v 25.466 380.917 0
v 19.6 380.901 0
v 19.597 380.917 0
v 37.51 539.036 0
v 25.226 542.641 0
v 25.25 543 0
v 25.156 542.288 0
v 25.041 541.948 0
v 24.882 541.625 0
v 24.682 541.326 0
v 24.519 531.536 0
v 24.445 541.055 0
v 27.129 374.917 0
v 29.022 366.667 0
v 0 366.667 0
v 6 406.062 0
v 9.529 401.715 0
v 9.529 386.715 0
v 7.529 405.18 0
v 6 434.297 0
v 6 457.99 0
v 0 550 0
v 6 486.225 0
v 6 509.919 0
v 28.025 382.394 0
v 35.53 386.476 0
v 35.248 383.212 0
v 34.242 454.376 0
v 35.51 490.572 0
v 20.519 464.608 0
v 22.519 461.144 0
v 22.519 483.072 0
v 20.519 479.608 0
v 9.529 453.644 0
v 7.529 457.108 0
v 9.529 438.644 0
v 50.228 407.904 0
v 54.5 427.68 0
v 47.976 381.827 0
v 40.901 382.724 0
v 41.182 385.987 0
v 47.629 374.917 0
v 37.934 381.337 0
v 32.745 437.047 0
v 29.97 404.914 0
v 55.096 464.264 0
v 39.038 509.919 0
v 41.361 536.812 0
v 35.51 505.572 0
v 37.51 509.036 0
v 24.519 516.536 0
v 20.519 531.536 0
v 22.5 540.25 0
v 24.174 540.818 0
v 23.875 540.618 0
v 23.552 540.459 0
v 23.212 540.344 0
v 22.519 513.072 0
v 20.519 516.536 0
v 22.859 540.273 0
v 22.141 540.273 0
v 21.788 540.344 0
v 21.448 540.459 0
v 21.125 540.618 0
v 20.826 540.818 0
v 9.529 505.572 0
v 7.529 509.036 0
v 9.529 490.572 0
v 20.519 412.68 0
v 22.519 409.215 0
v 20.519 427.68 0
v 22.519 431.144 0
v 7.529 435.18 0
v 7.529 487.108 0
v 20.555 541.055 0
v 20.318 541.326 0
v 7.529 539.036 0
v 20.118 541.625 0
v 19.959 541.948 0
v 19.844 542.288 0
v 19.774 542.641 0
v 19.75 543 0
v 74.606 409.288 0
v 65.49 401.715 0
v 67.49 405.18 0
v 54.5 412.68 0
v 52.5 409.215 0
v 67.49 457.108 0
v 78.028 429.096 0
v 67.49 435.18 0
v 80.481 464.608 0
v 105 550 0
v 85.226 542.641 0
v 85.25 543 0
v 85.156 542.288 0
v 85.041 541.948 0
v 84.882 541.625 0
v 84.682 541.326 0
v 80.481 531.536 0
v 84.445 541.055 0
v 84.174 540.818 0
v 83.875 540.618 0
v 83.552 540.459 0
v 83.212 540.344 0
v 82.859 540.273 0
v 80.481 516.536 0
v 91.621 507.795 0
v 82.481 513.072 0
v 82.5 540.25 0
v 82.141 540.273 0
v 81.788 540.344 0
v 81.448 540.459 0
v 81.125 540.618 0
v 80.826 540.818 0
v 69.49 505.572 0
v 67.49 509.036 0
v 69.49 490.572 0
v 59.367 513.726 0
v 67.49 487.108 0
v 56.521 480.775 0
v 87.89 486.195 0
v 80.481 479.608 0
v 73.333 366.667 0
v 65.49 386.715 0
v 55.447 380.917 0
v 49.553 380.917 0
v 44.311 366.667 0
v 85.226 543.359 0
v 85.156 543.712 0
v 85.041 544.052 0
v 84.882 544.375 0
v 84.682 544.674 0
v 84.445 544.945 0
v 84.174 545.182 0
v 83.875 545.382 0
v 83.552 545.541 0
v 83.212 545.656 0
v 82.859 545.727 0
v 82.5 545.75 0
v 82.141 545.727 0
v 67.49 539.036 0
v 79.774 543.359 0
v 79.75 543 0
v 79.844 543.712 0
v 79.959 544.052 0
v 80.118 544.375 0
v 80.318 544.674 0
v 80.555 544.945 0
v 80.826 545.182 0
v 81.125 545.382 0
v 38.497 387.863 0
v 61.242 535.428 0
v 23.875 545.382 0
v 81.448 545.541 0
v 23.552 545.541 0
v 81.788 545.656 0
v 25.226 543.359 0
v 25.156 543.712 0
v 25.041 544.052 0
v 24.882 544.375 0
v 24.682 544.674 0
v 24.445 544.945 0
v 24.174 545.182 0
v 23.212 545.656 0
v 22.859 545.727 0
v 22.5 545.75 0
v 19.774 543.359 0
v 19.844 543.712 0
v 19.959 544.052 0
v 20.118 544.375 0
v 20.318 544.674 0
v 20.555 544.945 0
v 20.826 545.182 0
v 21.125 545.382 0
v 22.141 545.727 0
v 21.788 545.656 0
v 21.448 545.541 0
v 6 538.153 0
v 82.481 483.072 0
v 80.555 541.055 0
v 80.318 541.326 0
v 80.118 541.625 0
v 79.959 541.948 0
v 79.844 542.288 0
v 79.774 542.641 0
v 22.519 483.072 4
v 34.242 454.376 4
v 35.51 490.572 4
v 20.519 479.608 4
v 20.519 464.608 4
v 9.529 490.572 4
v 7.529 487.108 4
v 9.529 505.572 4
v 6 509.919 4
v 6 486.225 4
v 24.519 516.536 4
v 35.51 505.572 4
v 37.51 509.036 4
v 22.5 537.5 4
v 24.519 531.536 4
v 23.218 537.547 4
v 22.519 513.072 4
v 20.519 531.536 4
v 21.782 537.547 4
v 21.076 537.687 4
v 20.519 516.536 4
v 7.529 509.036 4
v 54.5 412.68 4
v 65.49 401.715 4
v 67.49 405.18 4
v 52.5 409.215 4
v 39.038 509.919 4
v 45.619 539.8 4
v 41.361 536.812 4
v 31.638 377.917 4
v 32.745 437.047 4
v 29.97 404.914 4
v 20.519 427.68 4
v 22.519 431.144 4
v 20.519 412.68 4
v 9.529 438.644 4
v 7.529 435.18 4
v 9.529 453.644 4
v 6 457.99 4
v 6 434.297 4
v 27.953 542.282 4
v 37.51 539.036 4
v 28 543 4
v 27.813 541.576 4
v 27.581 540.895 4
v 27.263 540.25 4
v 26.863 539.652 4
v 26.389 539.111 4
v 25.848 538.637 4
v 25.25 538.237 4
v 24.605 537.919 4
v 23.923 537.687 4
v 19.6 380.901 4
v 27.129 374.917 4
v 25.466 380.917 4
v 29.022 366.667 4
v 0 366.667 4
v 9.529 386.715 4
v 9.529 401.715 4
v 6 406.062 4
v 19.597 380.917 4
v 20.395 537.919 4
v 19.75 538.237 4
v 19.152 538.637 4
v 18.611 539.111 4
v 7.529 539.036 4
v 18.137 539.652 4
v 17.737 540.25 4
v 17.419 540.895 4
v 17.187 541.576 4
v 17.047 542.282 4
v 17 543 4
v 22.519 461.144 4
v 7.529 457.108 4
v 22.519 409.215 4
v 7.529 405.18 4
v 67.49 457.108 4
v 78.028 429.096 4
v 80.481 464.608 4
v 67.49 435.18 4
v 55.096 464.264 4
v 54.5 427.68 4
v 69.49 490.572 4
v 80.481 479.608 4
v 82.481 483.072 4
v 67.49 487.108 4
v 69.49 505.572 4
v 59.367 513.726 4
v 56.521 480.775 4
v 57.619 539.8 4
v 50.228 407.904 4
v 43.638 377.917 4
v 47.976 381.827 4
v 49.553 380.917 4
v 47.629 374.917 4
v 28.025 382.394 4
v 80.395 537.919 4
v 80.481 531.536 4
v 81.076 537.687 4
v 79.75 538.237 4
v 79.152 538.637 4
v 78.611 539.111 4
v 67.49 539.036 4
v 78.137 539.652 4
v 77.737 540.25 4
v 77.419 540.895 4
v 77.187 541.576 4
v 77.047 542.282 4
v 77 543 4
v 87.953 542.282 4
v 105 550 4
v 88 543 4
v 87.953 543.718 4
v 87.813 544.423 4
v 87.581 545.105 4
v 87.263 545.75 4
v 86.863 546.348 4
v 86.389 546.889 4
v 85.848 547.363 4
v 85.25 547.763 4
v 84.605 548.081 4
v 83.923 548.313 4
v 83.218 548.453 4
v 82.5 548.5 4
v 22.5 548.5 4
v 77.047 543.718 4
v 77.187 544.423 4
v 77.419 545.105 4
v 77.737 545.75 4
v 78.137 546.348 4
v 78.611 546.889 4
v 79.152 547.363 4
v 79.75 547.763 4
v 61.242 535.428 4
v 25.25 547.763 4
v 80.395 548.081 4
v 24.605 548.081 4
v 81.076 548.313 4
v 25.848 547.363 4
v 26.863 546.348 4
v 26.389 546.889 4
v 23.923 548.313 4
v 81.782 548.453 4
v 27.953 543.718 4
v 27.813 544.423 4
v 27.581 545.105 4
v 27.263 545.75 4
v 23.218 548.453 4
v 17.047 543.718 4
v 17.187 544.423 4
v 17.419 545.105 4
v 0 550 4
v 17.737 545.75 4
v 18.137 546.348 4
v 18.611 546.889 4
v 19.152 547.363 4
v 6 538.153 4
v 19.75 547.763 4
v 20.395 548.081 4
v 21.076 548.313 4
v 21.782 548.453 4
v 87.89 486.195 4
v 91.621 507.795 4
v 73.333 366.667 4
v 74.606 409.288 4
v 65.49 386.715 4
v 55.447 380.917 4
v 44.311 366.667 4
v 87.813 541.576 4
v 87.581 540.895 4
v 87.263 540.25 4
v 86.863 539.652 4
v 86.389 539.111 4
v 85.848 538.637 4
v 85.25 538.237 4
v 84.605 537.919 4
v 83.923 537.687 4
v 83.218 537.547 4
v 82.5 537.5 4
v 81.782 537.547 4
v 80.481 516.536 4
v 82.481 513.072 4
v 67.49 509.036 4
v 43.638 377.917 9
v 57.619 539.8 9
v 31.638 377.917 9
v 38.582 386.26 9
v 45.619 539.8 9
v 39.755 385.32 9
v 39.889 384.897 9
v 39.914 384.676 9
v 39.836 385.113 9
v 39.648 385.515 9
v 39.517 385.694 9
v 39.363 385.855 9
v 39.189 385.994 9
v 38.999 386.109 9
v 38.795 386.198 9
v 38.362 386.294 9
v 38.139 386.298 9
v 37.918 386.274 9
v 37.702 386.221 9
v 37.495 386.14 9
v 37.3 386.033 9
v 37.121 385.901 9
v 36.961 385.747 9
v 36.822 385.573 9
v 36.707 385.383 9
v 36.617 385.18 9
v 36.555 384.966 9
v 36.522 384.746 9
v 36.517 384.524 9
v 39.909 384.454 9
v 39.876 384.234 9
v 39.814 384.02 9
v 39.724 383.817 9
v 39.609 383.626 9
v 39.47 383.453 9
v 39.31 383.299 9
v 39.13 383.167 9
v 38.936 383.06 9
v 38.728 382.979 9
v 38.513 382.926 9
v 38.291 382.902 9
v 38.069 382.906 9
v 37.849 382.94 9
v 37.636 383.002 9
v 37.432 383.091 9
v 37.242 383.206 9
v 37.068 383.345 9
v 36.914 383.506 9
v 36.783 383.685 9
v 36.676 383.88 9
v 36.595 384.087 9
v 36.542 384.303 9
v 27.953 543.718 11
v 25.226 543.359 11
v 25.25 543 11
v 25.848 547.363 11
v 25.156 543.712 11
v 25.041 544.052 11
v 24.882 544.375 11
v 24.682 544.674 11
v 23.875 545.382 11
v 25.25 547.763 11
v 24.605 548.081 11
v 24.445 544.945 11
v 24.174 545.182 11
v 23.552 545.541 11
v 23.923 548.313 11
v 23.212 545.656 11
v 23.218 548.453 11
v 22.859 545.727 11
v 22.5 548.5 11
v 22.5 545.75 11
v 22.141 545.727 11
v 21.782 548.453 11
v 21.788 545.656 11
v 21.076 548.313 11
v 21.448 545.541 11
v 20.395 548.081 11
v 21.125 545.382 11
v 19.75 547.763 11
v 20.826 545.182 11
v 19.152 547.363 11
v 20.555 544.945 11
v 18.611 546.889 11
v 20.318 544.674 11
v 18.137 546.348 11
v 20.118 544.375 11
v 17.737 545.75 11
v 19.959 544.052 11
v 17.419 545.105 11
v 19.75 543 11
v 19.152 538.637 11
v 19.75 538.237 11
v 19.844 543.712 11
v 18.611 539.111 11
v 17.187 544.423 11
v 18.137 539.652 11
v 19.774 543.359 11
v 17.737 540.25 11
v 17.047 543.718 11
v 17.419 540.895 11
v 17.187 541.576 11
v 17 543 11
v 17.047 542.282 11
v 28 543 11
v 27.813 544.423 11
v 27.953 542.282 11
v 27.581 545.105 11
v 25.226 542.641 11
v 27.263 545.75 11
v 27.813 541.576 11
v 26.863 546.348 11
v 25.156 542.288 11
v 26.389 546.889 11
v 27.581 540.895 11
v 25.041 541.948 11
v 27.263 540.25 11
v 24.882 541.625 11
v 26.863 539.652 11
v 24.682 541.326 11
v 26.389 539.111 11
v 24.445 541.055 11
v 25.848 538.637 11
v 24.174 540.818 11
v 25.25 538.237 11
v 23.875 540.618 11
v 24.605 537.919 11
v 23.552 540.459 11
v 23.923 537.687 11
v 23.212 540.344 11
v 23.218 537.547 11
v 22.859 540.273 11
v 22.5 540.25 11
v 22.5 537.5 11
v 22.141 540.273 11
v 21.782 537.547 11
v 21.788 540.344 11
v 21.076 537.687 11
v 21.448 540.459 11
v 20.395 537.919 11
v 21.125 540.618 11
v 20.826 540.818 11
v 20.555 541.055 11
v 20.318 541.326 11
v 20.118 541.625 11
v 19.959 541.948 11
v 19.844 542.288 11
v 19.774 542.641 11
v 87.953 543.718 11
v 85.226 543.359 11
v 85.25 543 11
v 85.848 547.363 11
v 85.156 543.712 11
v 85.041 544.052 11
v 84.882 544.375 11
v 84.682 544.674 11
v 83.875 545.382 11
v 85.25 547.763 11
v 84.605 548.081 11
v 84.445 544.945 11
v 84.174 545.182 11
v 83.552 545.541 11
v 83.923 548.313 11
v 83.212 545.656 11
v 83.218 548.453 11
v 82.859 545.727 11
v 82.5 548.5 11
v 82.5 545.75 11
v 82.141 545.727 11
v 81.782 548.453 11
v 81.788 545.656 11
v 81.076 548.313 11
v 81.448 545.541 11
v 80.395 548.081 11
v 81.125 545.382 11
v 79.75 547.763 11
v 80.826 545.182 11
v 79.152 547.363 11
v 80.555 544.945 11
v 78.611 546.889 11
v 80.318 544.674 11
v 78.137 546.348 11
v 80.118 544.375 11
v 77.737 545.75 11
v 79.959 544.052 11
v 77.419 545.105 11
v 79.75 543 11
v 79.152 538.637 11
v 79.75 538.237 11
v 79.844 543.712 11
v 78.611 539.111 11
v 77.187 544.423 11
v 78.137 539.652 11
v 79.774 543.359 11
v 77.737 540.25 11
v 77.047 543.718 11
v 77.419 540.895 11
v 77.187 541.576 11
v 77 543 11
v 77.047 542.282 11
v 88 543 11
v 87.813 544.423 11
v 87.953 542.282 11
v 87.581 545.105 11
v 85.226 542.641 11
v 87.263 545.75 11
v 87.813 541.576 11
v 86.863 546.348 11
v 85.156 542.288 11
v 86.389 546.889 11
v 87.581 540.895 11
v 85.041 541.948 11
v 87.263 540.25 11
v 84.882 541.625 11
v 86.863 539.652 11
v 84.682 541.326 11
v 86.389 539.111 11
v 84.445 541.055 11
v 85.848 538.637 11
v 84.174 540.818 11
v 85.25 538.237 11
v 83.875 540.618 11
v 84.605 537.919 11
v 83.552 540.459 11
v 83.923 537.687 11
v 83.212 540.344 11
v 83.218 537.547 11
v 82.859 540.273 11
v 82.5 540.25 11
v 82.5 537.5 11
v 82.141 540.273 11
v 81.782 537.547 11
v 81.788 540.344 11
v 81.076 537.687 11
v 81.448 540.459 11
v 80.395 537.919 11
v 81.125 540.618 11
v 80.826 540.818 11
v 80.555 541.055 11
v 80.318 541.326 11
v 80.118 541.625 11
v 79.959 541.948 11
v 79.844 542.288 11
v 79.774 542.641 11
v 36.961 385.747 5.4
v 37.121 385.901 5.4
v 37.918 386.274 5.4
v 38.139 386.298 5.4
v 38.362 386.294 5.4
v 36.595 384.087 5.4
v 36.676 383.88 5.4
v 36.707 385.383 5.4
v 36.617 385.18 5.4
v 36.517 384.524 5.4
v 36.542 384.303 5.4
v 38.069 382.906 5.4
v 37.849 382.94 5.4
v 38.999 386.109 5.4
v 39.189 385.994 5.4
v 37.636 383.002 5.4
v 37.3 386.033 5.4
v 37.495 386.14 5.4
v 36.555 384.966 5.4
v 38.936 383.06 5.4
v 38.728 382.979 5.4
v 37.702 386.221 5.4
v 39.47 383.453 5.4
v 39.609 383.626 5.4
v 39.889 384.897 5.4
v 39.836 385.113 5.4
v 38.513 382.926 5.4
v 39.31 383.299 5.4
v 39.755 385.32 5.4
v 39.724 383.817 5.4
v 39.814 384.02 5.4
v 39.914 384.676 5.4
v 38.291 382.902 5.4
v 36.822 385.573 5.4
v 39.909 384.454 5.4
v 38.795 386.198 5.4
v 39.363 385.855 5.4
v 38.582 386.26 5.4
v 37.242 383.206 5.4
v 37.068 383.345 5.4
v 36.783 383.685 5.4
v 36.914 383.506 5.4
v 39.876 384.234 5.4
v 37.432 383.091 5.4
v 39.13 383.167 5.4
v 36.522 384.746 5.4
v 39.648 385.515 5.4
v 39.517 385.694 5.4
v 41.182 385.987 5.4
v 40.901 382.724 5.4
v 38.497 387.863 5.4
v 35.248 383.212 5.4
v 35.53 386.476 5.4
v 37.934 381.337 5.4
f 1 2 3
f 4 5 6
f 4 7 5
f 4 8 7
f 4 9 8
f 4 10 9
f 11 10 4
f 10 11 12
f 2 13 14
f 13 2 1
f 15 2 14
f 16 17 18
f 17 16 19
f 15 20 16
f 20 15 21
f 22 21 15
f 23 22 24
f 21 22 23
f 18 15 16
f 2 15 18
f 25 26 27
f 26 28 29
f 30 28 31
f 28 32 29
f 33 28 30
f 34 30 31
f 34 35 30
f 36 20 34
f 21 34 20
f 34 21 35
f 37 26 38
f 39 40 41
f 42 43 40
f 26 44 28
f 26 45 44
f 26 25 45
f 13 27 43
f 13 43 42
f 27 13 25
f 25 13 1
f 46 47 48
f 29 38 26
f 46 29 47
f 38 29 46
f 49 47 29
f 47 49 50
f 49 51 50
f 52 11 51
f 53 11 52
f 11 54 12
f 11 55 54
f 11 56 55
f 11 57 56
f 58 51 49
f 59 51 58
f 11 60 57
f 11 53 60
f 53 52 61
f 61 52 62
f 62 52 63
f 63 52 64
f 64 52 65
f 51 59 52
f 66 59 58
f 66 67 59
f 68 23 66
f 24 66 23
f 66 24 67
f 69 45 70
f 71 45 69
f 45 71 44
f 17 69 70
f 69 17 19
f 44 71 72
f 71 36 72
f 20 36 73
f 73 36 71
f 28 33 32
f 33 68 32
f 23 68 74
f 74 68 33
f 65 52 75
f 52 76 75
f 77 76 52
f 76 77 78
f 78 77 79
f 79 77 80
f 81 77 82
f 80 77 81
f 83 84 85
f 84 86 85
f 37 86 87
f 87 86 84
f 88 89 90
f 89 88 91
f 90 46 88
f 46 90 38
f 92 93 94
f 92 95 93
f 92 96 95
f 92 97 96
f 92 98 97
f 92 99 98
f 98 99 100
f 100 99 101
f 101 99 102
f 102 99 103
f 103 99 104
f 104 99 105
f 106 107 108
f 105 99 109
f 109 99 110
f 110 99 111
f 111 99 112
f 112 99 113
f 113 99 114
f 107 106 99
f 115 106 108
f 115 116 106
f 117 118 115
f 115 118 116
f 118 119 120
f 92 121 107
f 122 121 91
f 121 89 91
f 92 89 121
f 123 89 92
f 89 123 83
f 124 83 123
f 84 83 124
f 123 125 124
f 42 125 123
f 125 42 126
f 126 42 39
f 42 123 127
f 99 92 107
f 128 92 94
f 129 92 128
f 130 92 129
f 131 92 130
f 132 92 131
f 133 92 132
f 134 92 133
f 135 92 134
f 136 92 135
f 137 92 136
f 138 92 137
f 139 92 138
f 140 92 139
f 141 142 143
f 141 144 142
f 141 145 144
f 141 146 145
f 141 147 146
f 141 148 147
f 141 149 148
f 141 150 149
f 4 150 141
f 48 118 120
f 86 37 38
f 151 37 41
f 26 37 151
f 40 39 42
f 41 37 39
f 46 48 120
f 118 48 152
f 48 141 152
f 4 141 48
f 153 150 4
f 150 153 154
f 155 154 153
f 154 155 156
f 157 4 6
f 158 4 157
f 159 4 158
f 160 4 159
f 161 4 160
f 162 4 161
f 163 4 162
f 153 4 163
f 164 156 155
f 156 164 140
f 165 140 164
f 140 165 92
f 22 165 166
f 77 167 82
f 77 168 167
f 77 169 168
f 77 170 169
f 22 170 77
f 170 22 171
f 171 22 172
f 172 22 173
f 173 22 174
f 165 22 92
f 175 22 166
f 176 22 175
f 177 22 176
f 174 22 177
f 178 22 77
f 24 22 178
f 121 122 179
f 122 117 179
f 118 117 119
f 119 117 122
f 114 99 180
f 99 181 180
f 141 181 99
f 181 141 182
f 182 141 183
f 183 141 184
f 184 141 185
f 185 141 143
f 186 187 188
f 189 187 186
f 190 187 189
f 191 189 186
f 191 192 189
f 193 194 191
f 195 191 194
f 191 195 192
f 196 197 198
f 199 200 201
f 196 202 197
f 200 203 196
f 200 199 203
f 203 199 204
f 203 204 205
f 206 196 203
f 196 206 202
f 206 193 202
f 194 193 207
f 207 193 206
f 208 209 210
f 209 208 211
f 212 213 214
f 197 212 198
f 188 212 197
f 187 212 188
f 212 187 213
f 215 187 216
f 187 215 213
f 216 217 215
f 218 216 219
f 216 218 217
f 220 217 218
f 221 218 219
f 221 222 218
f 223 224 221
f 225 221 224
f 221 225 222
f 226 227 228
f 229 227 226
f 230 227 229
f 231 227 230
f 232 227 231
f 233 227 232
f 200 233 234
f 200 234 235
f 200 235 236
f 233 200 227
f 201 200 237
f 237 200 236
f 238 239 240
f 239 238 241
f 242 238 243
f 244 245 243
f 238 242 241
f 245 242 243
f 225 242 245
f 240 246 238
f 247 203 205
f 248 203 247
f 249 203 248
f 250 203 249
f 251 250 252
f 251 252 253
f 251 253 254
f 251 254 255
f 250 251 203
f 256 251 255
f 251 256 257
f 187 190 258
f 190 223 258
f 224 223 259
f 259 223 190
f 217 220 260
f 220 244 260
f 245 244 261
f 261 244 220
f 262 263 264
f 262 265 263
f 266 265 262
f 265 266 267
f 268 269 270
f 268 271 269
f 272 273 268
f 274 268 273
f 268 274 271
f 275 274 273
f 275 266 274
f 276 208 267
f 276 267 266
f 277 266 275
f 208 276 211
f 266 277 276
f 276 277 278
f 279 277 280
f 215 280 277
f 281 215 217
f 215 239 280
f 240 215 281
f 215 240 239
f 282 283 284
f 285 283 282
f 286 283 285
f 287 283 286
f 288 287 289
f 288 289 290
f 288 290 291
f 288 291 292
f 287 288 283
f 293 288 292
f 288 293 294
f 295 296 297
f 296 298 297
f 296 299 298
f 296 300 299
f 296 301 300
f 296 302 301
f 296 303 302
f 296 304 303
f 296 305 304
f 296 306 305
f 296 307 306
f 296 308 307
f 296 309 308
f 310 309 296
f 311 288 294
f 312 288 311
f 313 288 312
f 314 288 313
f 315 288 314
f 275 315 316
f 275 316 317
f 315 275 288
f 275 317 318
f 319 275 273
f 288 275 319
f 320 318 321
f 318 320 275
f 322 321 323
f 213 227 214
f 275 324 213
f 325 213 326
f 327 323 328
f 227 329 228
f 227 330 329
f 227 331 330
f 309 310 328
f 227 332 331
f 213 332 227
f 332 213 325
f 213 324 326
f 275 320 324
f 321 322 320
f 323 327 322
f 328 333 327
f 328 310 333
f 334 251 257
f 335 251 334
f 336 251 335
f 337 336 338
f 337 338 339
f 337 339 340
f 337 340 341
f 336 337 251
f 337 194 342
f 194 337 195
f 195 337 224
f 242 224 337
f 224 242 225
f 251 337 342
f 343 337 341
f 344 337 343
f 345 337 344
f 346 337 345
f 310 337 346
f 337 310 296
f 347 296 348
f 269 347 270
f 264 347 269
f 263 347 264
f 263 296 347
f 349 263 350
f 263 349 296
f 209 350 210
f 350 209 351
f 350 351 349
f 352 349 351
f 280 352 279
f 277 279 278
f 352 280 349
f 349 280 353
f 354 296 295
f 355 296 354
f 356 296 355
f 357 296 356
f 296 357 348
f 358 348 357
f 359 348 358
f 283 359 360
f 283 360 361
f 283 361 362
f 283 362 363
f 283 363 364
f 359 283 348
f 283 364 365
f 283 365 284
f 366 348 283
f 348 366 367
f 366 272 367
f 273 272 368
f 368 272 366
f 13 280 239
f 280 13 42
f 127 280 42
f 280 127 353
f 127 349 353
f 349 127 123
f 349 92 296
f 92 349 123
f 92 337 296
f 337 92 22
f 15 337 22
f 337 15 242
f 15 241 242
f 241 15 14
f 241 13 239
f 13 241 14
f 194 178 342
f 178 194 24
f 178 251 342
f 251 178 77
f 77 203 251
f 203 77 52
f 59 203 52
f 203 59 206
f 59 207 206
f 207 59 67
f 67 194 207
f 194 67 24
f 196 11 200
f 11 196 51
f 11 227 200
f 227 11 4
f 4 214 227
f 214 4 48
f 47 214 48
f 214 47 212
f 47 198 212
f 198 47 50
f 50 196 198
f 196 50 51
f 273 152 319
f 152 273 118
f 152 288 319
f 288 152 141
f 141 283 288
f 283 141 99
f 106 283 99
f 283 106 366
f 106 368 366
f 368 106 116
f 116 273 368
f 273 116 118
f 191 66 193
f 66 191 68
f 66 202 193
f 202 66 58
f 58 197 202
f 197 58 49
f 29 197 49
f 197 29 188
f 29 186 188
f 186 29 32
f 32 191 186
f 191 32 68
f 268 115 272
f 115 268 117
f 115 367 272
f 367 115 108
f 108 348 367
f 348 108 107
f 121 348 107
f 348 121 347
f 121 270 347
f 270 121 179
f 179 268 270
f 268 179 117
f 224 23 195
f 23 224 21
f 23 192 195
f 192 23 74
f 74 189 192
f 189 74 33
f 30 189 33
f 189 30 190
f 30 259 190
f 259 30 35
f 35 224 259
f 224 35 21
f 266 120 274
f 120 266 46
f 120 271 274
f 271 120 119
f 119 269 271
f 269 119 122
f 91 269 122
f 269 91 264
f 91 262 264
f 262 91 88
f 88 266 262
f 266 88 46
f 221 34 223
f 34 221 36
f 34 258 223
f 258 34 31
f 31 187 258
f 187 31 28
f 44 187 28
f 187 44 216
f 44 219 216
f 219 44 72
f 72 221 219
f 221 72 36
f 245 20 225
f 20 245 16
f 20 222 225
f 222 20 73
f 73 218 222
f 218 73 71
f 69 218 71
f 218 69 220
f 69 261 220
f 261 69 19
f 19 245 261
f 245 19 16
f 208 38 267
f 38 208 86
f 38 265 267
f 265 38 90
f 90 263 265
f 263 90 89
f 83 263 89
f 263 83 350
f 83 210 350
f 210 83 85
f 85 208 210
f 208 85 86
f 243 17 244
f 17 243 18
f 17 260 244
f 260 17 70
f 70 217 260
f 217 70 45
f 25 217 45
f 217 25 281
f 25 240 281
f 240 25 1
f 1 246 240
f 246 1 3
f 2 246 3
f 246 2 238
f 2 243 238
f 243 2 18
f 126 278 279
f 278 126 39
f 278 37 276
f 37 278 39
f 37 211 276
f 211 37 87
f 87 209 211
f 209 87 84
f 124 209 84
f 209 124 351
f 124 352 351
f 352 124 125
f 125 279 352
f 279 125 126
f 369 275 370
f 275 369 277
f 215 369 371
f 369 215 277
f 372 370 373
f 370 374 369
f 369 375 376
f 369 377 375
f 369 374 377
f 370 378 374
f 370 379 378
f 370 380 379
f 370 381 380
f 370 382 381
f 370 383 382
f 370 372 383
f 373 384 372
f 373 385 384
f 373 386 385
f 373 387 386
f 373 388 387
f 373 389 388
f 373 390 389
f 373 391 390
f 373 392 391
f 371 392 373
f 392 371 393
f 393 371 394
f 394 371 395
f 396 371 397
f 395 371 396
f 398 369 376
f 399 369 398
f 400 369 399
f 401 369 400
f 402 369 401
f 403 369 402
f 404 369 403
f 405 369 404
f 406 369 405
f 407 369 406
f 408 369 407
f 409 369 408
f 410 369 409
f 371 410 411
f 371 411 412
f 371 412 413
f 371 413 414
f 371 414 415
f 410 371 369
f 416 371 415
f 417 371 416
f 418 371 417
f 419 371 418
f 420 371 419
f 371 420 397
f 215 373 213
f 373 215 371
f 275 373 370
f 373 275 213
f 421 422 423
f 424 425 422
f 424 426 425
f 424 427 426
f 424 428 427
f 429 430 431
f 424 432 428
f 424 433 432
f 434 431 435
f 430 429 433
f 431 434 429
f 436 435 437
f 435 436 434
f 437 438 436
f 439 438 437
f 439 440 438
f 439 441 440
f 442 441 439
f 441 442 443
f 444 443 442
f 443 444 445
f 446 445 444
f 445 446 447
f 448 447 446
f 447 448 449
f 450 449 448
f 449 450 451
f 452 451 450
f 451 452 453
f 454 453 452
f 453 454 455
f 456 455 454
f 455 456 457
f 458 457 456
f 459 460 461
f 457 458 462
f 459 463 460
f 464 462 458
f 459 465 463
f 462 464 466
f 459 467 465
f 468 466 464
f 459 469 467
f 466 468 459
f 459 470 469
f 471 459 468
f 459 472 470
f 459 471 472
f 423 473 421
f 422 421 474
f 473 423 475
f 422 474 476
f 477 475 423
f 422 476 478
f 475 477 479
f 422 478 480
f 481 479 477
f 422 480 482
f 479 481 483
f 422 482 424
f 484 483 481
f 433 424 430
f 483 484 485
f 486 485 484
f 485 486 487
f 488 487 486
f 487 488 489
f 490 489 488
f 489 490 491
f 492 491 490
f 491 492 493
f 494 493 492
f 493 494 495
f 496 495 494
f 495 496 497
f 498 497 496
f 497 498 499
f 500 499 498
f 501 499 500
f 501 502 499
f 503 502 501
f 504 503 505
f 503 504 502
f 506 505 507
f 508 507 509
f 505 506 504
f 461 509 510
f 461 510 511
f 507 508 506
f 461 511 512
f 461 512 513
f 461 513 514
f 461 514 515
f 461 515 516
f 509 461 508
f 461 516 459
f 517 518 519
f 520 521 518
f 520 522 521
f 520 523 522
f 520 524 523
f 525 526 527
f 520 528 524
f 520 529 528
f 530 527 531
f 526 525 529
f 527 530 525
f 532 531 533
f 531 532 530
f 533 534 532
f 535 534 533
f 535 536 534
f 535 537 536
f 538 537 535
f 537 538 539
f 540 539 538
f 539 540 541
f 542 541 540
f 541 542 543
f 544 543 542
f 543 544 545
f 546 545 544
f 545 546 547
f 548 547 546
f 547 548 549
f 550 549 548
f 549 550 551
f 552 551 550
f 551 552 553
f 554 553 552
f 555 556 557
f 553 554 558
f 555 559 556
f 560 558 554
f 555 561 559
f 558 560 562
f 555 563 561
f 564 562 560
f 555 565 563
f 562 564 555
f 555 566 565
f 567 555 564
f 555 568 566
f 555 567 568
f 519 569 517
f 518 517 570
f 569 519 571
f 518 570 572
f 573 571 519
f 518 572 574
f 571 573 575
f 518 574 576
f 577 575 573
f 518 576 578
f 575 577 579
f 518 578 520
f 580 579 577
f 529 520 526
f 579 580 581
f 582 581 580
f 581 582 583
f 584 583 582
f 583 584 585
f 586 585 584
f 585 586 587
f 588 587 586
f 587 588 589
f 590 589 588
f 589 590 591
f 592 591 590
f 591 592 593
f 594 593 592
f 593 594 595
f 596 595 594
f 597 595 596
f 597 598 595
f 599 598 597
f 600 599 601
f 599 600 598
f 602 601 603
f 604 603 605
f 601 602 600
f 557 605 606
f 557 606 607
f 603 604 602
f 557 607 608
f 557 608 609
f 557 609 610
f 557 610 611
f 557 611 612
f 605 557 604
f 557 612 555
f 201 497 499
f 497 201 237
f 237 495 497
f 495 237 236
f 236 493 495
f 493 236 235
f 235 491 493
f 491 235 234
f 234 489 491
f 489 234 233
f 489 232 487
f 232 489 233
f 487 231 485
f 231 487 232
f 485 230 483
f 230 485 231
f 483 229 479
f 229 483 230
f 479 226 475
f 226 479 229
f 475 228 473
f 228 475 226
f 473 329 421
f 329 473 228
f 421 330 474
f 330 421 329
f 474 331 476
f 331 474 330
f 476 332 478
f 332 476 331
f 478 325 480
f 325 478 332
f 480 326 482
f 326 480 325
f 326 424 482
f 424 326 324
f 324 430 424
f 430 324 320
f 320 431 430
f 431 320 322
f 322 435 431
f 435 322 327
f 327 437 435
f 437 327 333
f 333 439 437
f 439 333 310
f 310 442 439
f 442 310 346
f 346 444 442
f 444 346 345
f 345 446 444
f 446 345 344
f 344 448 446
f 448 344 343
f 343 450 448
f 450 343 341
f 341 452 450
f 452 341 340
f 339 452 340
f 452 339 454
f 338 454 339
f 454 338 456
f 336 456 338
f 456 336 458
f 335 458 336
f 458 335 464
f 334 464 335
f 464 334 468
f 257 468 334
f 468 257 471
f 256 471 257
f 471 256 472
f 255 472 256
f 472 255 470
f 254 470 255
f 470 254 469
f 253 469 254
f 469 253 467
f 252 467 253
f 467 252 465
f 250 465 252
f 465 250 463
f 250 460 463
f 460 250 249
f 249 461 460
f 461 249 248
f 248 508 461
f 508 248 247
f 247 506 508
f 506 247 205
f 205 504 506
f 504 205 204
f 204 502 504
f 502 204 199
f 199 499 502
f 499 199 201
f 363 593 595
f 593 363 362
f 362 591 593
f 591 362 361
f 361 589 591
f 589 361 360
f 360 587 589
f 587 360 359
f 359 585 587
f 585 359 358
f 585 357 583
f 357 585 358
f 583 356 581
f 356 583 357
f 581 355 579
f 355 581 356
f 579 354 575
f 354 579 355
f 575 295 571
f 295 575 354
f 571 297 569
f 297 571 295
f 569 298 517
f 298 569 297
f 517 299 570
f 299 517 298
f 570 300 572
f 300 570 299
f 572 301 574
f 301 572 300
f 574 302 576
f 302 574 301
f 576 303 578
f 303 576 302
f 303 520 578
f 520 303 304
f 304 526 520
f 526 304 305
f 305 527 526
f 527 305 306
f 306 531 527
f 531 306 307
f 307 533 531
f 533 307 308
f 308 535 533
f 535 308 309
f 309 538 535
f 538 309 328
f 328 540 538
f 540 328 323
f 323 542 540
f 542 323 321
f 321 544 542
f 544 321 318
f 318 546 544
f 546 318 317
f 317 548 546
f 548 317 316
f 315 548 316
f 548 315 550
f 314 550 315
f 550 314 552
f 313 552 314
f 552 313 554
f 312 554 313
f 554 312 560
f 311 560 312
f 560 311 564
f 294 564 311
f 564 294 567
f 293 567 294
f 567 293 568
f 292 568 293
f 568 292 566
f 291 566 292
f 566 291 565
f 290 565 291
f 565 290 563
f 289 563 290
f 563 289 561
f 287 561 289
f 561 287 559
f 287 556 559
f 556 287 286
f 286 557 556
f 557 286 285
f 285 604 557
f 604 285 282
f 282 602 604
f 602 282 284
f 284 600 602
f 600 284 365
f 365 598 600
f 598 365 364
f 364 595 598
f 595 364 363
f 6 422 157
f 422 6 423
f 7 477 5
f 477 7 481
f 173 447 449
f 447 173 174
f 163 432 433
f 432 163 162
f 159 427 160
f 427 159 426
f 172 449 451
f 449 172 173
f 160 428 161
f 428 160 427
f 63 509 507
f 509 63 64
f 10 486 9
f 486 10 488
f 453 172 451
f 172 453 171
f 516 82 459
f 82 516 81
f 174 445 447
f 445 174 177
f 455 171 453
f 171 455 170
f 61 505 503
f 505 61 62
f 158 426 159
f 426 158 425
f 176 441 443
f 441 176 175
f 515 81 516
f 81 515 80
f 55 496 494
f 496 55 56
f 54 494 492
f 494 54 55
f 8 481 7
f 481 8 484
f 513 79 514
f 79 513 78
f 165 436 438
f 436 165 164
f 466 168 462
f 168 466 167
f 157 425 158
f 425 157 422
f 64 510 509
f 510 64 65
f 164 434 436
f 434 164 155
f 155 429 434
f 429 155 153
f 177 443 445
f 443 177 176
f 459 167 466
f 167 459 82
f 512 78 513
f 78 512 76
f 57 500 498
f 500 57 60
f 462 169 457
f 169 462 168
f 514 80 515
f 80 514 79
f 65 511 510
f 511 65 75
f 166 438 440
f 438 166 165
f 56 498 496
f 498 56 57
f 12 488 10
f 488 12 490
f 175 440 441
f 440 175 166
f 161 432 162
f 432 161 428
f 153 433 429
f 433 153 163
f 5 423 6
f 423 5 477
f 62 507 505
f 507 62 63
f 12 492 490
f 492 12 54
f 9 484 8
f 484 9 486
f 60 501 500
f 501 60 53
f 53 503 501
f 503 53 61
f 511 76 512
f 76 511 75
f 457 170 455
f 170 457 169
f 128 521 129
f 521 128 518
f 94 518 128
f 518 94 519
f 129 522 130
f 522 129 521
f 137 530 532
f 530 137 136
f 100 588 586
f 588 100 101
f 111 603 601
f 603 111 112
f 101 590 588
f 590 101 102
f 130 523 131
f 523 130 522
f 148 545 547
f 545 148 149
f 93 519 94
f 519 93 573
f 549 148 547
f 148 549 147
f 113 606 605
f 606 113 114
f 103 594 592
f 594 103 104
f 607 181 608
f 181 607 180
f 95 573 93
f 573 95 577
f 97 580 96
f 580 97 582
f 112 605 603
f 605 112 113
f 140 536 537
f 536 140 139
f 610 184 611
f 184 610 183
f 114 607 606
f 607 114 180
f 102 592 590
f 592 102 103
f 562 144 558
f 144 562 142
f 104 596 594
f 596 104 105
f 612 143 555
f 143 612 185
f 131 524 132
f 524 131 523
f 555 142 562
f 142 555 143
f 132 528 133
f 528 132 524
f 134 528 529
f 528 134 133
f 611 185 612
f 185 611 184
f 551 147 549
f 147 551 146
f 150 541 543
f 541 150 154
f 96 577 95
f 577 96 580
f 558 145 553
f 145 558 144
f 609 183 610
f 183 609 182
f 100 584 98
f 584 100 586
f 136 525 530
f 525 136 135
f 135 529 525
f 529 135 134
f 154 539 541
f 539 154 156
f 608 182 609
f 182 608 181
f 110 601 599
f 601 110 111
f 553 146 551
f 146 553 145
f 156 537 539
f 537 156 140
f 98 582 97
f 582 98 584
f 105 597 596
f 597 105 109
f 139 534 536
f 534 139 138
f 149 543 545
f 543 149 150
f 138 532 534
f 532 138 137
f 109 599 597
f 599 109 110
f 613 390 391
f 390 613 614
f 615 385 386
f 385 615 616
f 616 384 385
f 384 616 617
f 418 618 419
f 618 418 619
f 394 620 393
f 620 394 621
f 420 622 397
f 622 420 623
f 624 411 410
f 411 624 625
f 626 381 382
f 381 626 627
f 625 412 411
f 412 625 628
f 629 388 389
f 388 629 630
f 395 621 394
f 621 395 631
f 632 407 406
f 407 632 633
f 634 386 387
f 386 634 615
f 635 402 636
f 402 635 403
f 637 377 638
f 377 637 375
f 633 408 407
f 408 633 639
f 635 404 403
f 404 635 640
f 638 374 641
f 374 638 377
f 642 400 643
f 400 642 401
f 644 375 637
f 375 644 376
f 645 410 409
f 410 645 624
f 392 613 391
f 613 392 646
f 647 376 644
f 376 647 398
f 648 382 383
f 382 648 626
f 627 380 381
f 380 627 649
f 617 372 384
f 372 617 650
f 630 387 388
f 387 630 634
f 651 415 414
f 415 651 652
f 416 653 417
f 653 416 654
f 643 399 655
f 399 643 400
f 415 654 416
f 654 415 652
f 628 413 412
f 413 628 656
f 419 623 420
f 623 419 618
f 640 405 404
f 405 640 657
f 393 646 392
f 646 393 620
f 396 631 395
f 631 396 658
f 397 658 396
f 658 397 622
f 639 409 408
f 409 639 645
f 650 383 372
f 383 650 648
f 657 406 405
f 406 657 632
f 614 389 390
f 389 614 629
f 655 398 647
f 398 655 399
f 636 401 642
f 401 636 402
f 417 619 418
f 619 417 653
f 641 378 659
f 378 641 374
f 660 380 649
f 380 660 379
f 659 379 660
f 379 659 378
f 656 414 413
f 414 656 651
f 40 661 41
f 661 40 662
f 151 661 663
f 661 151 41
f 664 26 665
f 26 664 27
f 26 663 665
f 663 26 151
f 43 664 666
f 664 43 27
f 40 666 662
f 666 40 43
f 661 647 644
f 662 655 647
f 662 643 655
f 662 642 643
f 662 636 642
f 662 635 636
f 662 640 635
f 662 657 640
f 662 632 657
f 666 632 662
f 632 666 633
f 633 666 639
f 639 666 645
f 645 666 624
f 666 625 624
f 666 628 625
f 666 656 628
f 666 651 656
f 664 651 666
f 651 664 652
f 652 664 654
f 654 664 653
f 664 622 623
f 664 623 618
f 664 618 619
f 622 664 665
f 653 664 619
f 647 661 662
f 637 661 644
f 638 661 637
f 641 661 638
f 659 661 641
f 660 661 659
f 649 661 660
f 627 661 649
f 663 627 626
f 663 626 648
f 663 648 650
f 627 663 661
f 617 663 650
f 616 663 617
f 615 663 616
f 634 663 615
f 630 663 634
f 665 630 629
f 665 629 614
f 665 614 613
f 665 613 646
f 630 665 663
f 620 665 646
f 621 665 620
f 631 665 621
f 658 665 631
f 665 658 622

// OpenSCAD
// Window cat guard (tilt window): a CanFactory generator, published under CC BY-NC-SA 4.0.
//
// An adaptation of "Tilted window cat protection" on MakerWorld
// (https://makerworld.com/de/models/3234292-tilted-window-cat-protection, CC BY-NC-SA 4.0):
// a new parametric generator built the way its parts are (references/); see ../ATTRIBUTION.md.
//
// A tilted (bottom-hung) window leaves a triangular gap on each side between
// the sash and the frame, and a gap across the top. A cat that squeezes into
// a side gap slides down into the narrowing wedge and is trapped. The guard
// closes the gaps with printed honeycomb panels:
//
// - two side panels (PART = "side", SIDE = "left" or "right"): a right-angled
//   trapezoid, HEIGHT tall, GAP wide at the top and TIP wide at the bottom,
//   with one spine along its middle;
// - a top strip (PART = "strip"), GAP deep, spanning the window's WIDTH
//   between the side panels, with two ribs along it.
//
// Every panel longer than MAX_LENGTH is split into equal segments, each its
// own part (SEGMENT; 1 = the side panel's top or the strip's left end), so
// that every part fits a print bed. This is how the reference parts in
// references/ are built (see docs/window-cat-guard.md for what was measured):
//
// - segments join edge to edge with an in-plane dovetail: a tab on one
//   segment drops into a notch in the next, perpendicular to the plate;
// - the spine (or rib) runs on over the tab and laps LAP mm onto the next
//   segment's plate, so the joint cannot fold and the segments stay flush;
// - the dovetail only goes together, and comes apart, perpendicular to the
//   plate. So that the joint holds (JOINTS = "nut-bolt" or "threaded-insert";
//   not in the reference), a splice bar (PART = "bar") lies on the two spines
//   (or ribs) across every joint, with one countersunk screw down into each
//   segment: into a nut in a pocket from the plate's back, or into a heat-set
//   insert in the spine. JOINTS = "glue" leaves the dovetails as they are;
// - the top strip's two end segments carry pins along the strip, which plug
//   into bosses on the side panels' top segments: the guard is one U-shaped
//   frame that stands in the window.
//
// Every part prints flat as modelled: the plate on the bed (z = 0), spine,
// ribs and bosses on top, no supports; a splice bar lies flat, its countersinks up. The pins lie along the bed with a
// flat underside. A segment keeps the panel's own coordinates (a side panel:
// x across the gap from its straight edge, y up from its tip; the strip: x
// along it from its left end, y across the gap), so the assembly places every
// segment of a panel at the same pose; the slicer centres them on the bed.
//
// The joint sizes below are mirrored by WINDOW_CAT_GUARD in
// packages/contracts/src/windowCatGuard.ts (a test compares them).

// ---------------------------------------------------------------

// Which piece to make: a side panel segment, a top strip segment or a splice bar (all bars are alike)
PART = "side"; //[side,strip,bar]
// Which side panel: the right one is the left one mirrored
SIDE = "left"; //[left,right]
// Which segment (1 = the side panel's top / the strip's left end)
SEGMENT = 1; //[1:1:8]

// Height of a side panel: the height of the side gap it closes
HEIGHT = 550; //[150:1:1500]
// Width of the side gap at the top: the side panels' top width and the strip's depth
GAP = 105; //[60:0.5:200]
// Width of a side panel at its bottom (tip)
TIP = 10; //[4:0.5:60]
// Window width: outside to outside of the two side panels
WIDTH = 900; //[300:1:1600]
// Longest part: a panel longer than this is split into equal segments
MAX_LENGTH = 210; //[120:1:300]
// Whether there is a top strip (and, for it, bosses on the side panels)
STRIP = true;
// Plate thickness
THICKNESS = 4; //[2.4:0.1:6]
// Height of the spine and the ribs above the plate
RIB_HEIGHT = 5; //[2:0.5:12]
// Honeycomb hole size, corner to corner (vertical); 0 for solid plates
CELL = 30; //[0:0.5:60]
// Web between two honeycomb holes
WEB = 4; //[2:0.1:10]
// Solid border round every plate
BORDER = 6; //[3:0.5:15]
// Play in every joint, on each side
FIT = 0.25; //[0.05:0.05:0.6]
// How the segments hold together: a splice bar over every joint, screwed into nuts or heat-set inserts; or the dovetails alone (glued)
JOINTS = "nut-bolt"; //[nut-bolt,threaded-insert,glue]

// The splice bars' fasteners, from the parts library: the screw's clearance hole (ISO 273, medium) and the countersunk screw
// (its length includes its head), the insert's hole and the depth its maker asks for, and the nut (across flats, height, shape).
SCREW_HOLE = 3.4;
SCREW_D = 3;
SCREW_DK = 6;
SCREW_K = 1.7;
SCREW_L = 10;
INSERT_HOLE = 4;
INSERT_DEPTH = 6.7;
NUT_S = 5.5;
NUT_H = 2.4;
NUT_SHAPE = "hex";

// ---------------------------------------------------------------
// Joint sizes (fixed; mirrored by WINDOW_CAT_GUARD in windowCatGuard.ts)

SPINE_W = 12;      // side panel spine width
RIB_W = 4;         // top strip rib width
RIB_SPACING = 60;  // the strip's ribs (and the bosses) this far apart, at most
TAB_DEPTH = 8;     // dovetail: how far the tab reaches into the next segment
TAB_FLARE = 3;     // dovetail: how much wider the tab's tip is than its root, on each side
TAB_MARGIN = 1;    // dovetail: the tab's root is this much wider than the spine or rib, on each side
LAP = 3;           // the spine or rib laps this far onto the next segment's plate
PIN_D = 5;         // the strip's pins
PIN_FLAT = 0.3;    // a pin's axis this far below its radius, so it lies on a flat
BOSS_D = 11;       // the side panels' bosses
BOSS_H = 7;        // the bosses stand this high on the plate
BOSS_INSET = 7;    // a boss's centre this far below the side panel's top
END_GAP = 0.5;     // between the strip's end and a boss
SPLICE_W = 12;     // splice bar: width (the spine's; the strip's ribs widen to it under a bar)
SPLICE_T = 4;      // splice bar: thickness
SPLICE_NEAR = 2;   // splice bar: its screw into the segment with the tab, this far past the joint (in the tab)
SPLICE_FAR = 18;   // splice bar: its screw into the segment with the notch, this far past the joint (past the lap)
SPLICE_END = 6;    // splice bar: from each screw's axis to the bar's end
SINK_PLAY = 0.2;   // a countersink is this much wider than the screw's head
NUT_PLAY = 0.2;    // a nut's pocket is this much wider than the nut
NUT_RECESS = 0.2;  // a nut sits at least this far inside the plate's back
NUT_ROOF = 1.2;    // the least spine (or rib) left over a nut's pocket

$fn = 48;
ROOT = 1;          // a tab starts this far inside its own plate, so that the two fuse without slivers

// ---------------------------------------------------------------
// Derived layout (mirrored by windowCatGuardLayout in windowCatGuard.ts)

SIDE_SEGMENTS = max(1, ceil(HEIGHT / MAX_LENGTH - 1e-9));
SIDE_LENGTH = HEIGHT / SIDE_SEGMENTS;
// the ribs and the bosses: centred across the gap, as far apart as RIB_SPACING
// and the bosses' clearance from the plate's edge allow
SPACING = min(RIB_SPACING, GAP - 2 * (BORDER + BOSS_D / 2 + 1));
RIBS = [GAP / 2 - SPACING / 2, GAP / 2 + SPACING / 2];
PIN_Z = PIN_D / 2 - PIN_FLAT;
PIN_L = END_GAP + BOSS_H + THICKNESS - 0.5;
STRIP_START = THICKNESS + BOSS_H + END_GAP;
STRIP_UNDER = HEIGHT - BOSS_INSET - PIN_Z;  // the strip's underside, in the side panels' height
STRIP_LENGTH = WIDTH - 2 * STRIP_START;
STRIP_SEGMENTS = max(1, ceil(STRIP_LENGTH / MAX_LENGTH - 1e-9));
STRIP_PIECE = STRIP_LENGTH / STRIP_SEGMENTS;

// The splice bars (mirrored by WINDOW_CAT_GUARD.splice and windowCatGuardFasteners in windowCatGuard.ts). A bar lies on the
// spines (or ribs) of two segments across their joint, from SPLICE_NEAR - SPLICE_END to SPLICE_FAR + SPLICE_END past it.
SPLICED = JOINTS != "glue";
STACK = THICKNESS + RIB_HEIGHT;                       // a spine's or rib's top over the plate's back
SPLICE_L = SPLICE_FAR - SPLICE_NEAR + 2 * SPLICE_END;
// a countersunk screw's head is flush with the bar's top, so its tip is SCREW_L below it
SCREW_TIP = STACK + SPLICE_T - SCREW_L;
// a nut sits on the screw's tip (or NUT_RECESS inside the back, if the tip is nearer it), drawn against its pocket's ceiling
NUT_TOP = max(SCREW_TIP, NUT_RECESS) + NUT_H;
IS_SQUARE_NUT = NUT_SHAPE[0] == "s";                  // "square" or "square-thin"; the others are hexagonal
NUT_R = NUT_S / (IS_SQUARE_NUT ? sqrt(2) : sqrt(3)) + NUT_PLAY / 2;
// an insert's hole: as deep as its maker asks, or deeper, so that the screw's tip stays in it; through the plate if need be
INSERT_HOLE_DEPTH = min(STACK + 1, max(INSERT_DEPTH, SCREW_L - SPLICE_T + 0.5));

// The cut for one of a bar's screws at `at` on the plate, the spine running at angle `a`: an insert's hole from the spine's top,
// or a clearance hole through and a nut's pocket from the plate's back, a nut's corners along the spine.
module fastener_cut(at, a) {
  translate([at[0], at[1], 0]) rotate(a) {
    if (JOINTS == "threaded-insert") {
      translate([0, 0, STACK - INSERT_HOLE_DEPTH]) cylinder(d = INSERT_HOLE, h = INSERT_HOLE_DEPTH + 1);
    } else if (JOINTS == "nut-bolt") {
      translate([0, 0, -1]) cylinder(d = SCREW_HOLE, h = STACK + 2);
      translate([0, 0, -1]) rotate(IS_SQUARE_NUT ? 45 : 0) cylinder(r = NUT_R, h = NUT_TOP + 1, $fn = IS_SQUARE_NUT ? 4 : 6);
    }
  }
}

// A splice bar, in its own frame: centred, along x, its back on the bed, a countersunk hole for each screw. Each countersink is
// as wide as the head (plus play) and as deep as the head's cylindrical edge, then 90 degrees down to the clearance hole.
module splice_bar() {
  sink = SCREW_DK + SINK_PLAY;
  rim = max(0, SCREW_K - (SCREW_DK - SCREW_D) / 2);
  difference() {
    linear_extrude(SPLICE_T) offset(r = 1) square([SPLICE_L - 2, SPLICE_W - 2], center = true);
    for (x = [-1, 1] * (SPLICE_FAR - SPLICE_NEAR) / 2) translate([x, 0, 0]) {
      translate([0, 0, -1]) cylinder(d = SCREW_HOLE, h = SPLICE_T + 2);
      translate([0, 0, SPLICE_T - rim]) cylinder(d = sink, h = rim + 1);
      translate([0, 0, SPLICE_T - rim - sink / 2]) cylinder(d1 = 0, d2 = sink, h = sink / 2);
    }
  }
}

// ---------------------------------------------------------------
// Side panel (left, in its own coordinates: x across, y up from the tip)

function side_width(y) = TIP + (GAP - TIP) * y / HEIGHT;
function spine_x(y) = side_width(y) / 2;
SIDE_OUTLINE = [[0, 0], [TIP, 0], [GAP, HEIGHT], [0, HEIGHT]];

// the dovetail tab at the joint at height y (from the segment below, reaching up),
// following the spine; `grow` widens it on every side (for the notch)
module side_tab(y, grow = 0) {
  root = SPINE_W / 2 + TAB_MARGIN + grow;
  tip = root + TAB_FLARE;
  y0 = y - FIT - ROOT; y1 = y + TAB_DEPTH + grow;
  polygon([[spine_x(y0) - root, y0], [spine_x(y0) + root, y0], [spine_x(y1) + tip, y1], [spine_x(y1) - tip, y1]]);
}

// the spine's direction (as an angle), and the point s along the spine past its point at height y
SPINE_A = atan2(1, (GAP - TIP) / (2 * HEIGHT));
function side_at(y, s) = [spine_x(y), y] + s * [cos(SPINE_A), sin(SPINE_A)];

// the band along the spine from height y0 to y1
module side_spine_band(y0, y1, half) {
  polygon([[spine_x(y0) - half, y0], [spine_x(y0) + half, y0], [spine_x(y1) + half, y1], [spine_x(y1) - half, y1]]);
}

function side_bottom(k) = (SIDE_SEGMENTS - k) * SIDE_LENGTH;  // segment k from the top
function side_top(k) = side_bottom(k) + SIDE_LENGTH;

module side_plate(k) {
  y0 = side_bottom(k); y1 = side_top(k);
  difference() {
    union() {
      intersection() {
        polygon(SIDE_OUTLINE);
        translate([-1, y0]) square([GAP + 2, y1 - y0 - (k > 1 ? FIT : 0)]);
      }
      if (k > 1) side_tab(y1);
    }
    if (k < SIDE_SEGMENTS) side_tab(y0, FIT);
  }
}

// where the spine runs on this segment: from past the lap of the segment below
// to the end of its own lap onto the segment above
// The spine starts where the panel is 1 mm wider than it on either side: towards the tip it would
// otherwise meet the plate's edges.
SPINE_START = max(0, (SPINE_W + 2 - TIP) / (GAP - TIP) * HEIGHT);

module side_spine(k) {
  y0 = max(SPINE_START, side_bottom(k) + (k < SIDE_SEGMENTS ? TAB_DEPTH + LAP + FIT : 0));
  // with a top strip, the top segment's spine stops 1 mm below the strip, which lies across it
  y1 = k > 1 ? side_top(k) + TAB_DEPTH + LAP : STRIP ? STRIP_UNDER - 1 : HEIGHT;
  if (y1 > y0) intersection() { side_spine_band(y0, y1, SPINE_W / 2); polygon(SIDE_OUTLINE); }
}

module side_bosses(grow = 0) {
  if (STRIP) for (x = RIBS) translate([x, HEIGHT - BOSS_INSET]) circle(d = BOSS_D + 2 * grow);
}

// where the honeycomb may not reach: under the spine, round the dovetails and the bosses
module side_solid(k) {
  side_spine_band(-1, HEIGHT + 1, SPINE_W / 2 + WEB);
  if (k > 1) offset(delta = BORDER) side_tab(side_top(k));
  if (k < SIDE_SEGMENTS) offset(delta = BORDER) side_tab(side_bottom(k), FIT);
  if (k == 1) side_bosses(WEB);
}

module side_holes(k) {
  y0 = side_bottom(k); y1 = side_top(k);
  difference() {
    intersection() {
      offset(delta = -BORDER) intersection() { polygon(SIDE_OUTLINE); translate([-1, y0]) square([GAP + 2, y1 - y0]); }
      honeycomb(y0, y1);
    }
    side_solid(k);
  }
}

module side_segment(k) {
  plate = THICKNESS; top = THICKNESS + RIB_HEIGHT;
  difference() {
    union() {
      linear_extrude(plate) difference() { side_plate(k); if (CELL > 0) side_holes(k); }
      // the spine stands on the plate and rests on the next segment's where it laps; a key 0.2 mm inside it, sunk into its
      // own plate, fuses the two (its faces never meet theirs)
      translate([0, 0, plate]) linear_extrude(top - plate) side_spine(k);
      translate([0, 0, plate - 0.5]) linear_extrude(1) offset(delta = -0.2) intersection() { side_spine(k); side_plate(k); }
      if (k == 1) translate([0, 0, plate - 0.5]) linear_extrude(BOSS_H + 0.5) side_bosses();
    }
    if (k == 1 && STRIP) for (x = RIBS) translate([x, HEIGHT - BOSS_INSET, -1]) cylinder(d = PIN_D + 2 * FIT, h = plate + BOSS_H + 2);
    // the splice bars' screws: in the tab at the top, past the lap at the bottom
    if (SPLICED && k > 1) fastener_cut(side_at(side_top(k), SPLICE_NEAR), SPINE_A);
    if (SPLICED && k < SIDE_SEGMENTS) fastener_cut(side_at(side_bottom(k), SPLICE_FAR), SPINE_A);
  }
}

// ---------------------------------------------------------------
// Top strip (in its own coordinates: x along it from its left end, y across)

module strip_tab(x, y, grow = 0) {
  root = RIB_W / 2 + TAB_MARGIN + 2 + grow;
  tip = root + TAB_FLARE;
  x0 = x - FIT - ROOT; x1 = x + TAB_DEPTH + grow;
  polygon([[x0, y - root], [x0, y + root], [x1, y + tip], [x1, y - tip]]);
}

function strip_start(k) = (k - 1) * STRIP_PIECE;
function strip_end(k) = k * STRIP_PIECE;

module strip_plate(k) {
  x0 = strip_start(k); x1 = strip_end(k);
  difference() {
    union() {
      translate([x0, 0]) square([x1 - x0 - (k < STRIP_SEGMENTS ? FIT : 0), GAP]);
      if (k < STRIP_SEGMENTS) for (y = RIBS) strip_tab(x1, y);
    }
    if (k > 1) for (y = RIBS) strip_tab(x0, y, FIT);
  }
}

// the joints a strip segment has: at its right end (its tab) and its left end (its notch)
function strip_joints(k) = [if (k < STRIP_SEGMENTS) strip_end(k), if (k > 1) strip_start(k)];

// a splice bar's footprint over the joint at x, on the rib at y, grown by `grow`
module strip_bar_footprint(x, y, grow = 0) {
  translate([x + SPLICE_NEAR - SPLICE_END - grow, y - SPLICE_W / 2 - grow]) square([SPLICE_L + 2 * grow, SPLICE_W + 2 * grow]);
}

module strip_ribs(k) {
  x0 = strip_start(k) + (k > 1 ? TAB_DEPTH + LAP + FIT : 0);
  x1 = strip_end(k) + (k < STRIP_SEGMENTS ? TAB_DEPTH + LAP : 0);
  for (y = RIBS) translate([x0, y - RIB_W / 2]) square([x1 - x0, RIB_W]);
  // under a splice bar, the rib is as wide as the bar
  if (SPLICED) for (y = RIBS) intersection() {
    translate([x0, y - SPLICE_W / 2]) square([x1 - x0, SPLICE_W]);
    union() for (x = strip_joints(k)) strip_bar_footprint(x, y);
  }
}

module strip_solid(k) {
  for (y = RIBS) translate([-1, y - RIB_W / 2 - WEB]) square([STRIP_LENGTH + 2, RIB_W + 2 * WEB]);
  if (k < STRIP_SEGMENTS) for (y = RIBS) offset(delta = BORDER) strip_tab(strip_end(k), y);
  if (k > 1) for (y = RIBS) offset(delta = BORDER) strip_tab(strip_start(k), y, FIT);
  if (SPLICED) for (x = strip_joints(k), y = RIBS) strip_bar_footprint(x, y, WEB);
}

module strip_holes(k) {
  difference() {
    intersection() {
      translate([strip_start(k) + BORDER, BORDER]) square([STRIP_PIECE - 2 * BORDER, GAP - 2 * BORDER]);
      honeycomb_along(strip_start(k), strip_end(k));
    }
    strip_solid(k);
  }
}

module strip_pin(x, y, direction) {
  intersection() {
    translate([x, y, PIN_Z]) rotate([0, 90 * direction, 0]) translate([0, 0, -1]) cylinder(d = PIN_D, h = PIN_L + 1);
    translate([x - PIN_L - 2, y - PIN_D, 0]) cube([2 * PIN_L + 4, 2 * PIN_D, PIN_D + 1]);
  }
}

module strip_segment(k) {
  plate = THICKNESS; top = THICKNESS + RIB_HEIGHT;
  difference() {
    union() {
      linear_extrude(plate) difference() { strip_plate(k); if (CELL > 0) strip_holes(k); }
      translate([0, 0, plate]) linear_extrude(top - plate) strip_ribs(k);
      translate([0, 0, plate - 0.5]) linear_extrude(1) offset(delta = -0.2) intersection() { strip_ribs(k); strip_plate(k); }
      if (k == 1) for (y = RIBS) strip_pin(0, y, -1);
      if (k == STRIP_SEGMENTS) for (y = RIBS) strip_pin(STRIP_LENGTH, y, 1);
    }
    // the splice bars' screws: in the tab at the right end, past the lap at the left end
    if (SPLICED) for (y = RIBS) {
      if (k < STRIP_SEGMENTS) fastener_cut([strip_end(k) + SPLICE_NEAR, y], 0);
      if (k > 1) fastener_cut([strip_start(k) + SPLICE_FAR, y], 0);
    }
  }
}

// ---------------------------------------------------------------
// Honeycomb: hexagonal holes, a corner up, CELL corner to corner, WEB apart,
// laid out from the panel's top so that the rows line up across the segments.

HEX_R = CELL / 2;
HEX_PITCH = HEX_R * sqrt(3) + WEB;      // between two holes in a row
HEX_ROW = HEX_PITCH * sqrt(3) / 2;      // between two rows

module hexagon() { rotate(30) circle(r = HEX_R, $fn = 6); }

// The holes are clipped to the plate's open area (inside the border, off the spine
// or ribs). A hole whose centre lies outside it is left out, so that clipping
// never leaves a sliver: at most half a hole remains.

// a side panel's holes between heights y0 and y1, the rows counted down from its top
module honeycomb(y0, y1) {
  first = floor((HEIGHT - y1) / HEX_ROW) - 1; last = ceil((HEIGHT - y0) / HEX_ROW) + 1;
  for (row = [max(0, first) : last]) {
    y = HEIGHT - row * HEX_ROW;
    shift = (row % 2) * HEX_PITCH / 2;
    for (i = [-1 : ceil(GAP / HEX_PITCH) + 1]) {
      x = GAP / 2 + (i - floor(GAP / HEX_PITCH / 2)) * HEX_PITCH + shift;
      if (y > y0 + BORDER && y < y1 - BORDER && x > BORDER && x < side_width(y) - BORDER && abs(x - spine_x(y)) > SPINE_W / 2 + WEB)
        translate([x, y]) hexagon();
    }
  }
}

// the strip's holes between x0 and x1 along it, a corner pointing along it, the rows counted from its left end
module honeycomb_along(x0, x1) {
  first = floor(x0 / HEX_ROW) - 1; last = ceil(x1 / HEX_ROW) + 1;
  for (row = [max(0, first) : last]) {
    x = row * HEX_ROW;
    shift = (row % 2) * HEX_PITCH / 2;
    for (i = [-1 : ceil(GAP / HEX_PITCH) + 1]) {
      y = GAP / 2 + (i - floor(GAP / HEX_PITCH / 2)) * HEX_PITCH + shift;
      if (x > x0 + BORDER && x < x1 - BORDER && y > BORDER && y < GAP - BORDER && min([for (r = RIBS) abs(y - r)]) > RIB_W / 2 + WEB)
        translate([x, y]) rotate(-30) hexagon();
    }
  }
}

// ---------------------------------------------------------------

if (PART == "side") {
  if (SIDE == "right") mirror([1, 0, 0]) side_segment(SEGMENT); else side_segment(SEGMENT);
} else if (PART == "strip") {
  strip_segment(SEGMENT);
} else {
  splice_bar();
}
